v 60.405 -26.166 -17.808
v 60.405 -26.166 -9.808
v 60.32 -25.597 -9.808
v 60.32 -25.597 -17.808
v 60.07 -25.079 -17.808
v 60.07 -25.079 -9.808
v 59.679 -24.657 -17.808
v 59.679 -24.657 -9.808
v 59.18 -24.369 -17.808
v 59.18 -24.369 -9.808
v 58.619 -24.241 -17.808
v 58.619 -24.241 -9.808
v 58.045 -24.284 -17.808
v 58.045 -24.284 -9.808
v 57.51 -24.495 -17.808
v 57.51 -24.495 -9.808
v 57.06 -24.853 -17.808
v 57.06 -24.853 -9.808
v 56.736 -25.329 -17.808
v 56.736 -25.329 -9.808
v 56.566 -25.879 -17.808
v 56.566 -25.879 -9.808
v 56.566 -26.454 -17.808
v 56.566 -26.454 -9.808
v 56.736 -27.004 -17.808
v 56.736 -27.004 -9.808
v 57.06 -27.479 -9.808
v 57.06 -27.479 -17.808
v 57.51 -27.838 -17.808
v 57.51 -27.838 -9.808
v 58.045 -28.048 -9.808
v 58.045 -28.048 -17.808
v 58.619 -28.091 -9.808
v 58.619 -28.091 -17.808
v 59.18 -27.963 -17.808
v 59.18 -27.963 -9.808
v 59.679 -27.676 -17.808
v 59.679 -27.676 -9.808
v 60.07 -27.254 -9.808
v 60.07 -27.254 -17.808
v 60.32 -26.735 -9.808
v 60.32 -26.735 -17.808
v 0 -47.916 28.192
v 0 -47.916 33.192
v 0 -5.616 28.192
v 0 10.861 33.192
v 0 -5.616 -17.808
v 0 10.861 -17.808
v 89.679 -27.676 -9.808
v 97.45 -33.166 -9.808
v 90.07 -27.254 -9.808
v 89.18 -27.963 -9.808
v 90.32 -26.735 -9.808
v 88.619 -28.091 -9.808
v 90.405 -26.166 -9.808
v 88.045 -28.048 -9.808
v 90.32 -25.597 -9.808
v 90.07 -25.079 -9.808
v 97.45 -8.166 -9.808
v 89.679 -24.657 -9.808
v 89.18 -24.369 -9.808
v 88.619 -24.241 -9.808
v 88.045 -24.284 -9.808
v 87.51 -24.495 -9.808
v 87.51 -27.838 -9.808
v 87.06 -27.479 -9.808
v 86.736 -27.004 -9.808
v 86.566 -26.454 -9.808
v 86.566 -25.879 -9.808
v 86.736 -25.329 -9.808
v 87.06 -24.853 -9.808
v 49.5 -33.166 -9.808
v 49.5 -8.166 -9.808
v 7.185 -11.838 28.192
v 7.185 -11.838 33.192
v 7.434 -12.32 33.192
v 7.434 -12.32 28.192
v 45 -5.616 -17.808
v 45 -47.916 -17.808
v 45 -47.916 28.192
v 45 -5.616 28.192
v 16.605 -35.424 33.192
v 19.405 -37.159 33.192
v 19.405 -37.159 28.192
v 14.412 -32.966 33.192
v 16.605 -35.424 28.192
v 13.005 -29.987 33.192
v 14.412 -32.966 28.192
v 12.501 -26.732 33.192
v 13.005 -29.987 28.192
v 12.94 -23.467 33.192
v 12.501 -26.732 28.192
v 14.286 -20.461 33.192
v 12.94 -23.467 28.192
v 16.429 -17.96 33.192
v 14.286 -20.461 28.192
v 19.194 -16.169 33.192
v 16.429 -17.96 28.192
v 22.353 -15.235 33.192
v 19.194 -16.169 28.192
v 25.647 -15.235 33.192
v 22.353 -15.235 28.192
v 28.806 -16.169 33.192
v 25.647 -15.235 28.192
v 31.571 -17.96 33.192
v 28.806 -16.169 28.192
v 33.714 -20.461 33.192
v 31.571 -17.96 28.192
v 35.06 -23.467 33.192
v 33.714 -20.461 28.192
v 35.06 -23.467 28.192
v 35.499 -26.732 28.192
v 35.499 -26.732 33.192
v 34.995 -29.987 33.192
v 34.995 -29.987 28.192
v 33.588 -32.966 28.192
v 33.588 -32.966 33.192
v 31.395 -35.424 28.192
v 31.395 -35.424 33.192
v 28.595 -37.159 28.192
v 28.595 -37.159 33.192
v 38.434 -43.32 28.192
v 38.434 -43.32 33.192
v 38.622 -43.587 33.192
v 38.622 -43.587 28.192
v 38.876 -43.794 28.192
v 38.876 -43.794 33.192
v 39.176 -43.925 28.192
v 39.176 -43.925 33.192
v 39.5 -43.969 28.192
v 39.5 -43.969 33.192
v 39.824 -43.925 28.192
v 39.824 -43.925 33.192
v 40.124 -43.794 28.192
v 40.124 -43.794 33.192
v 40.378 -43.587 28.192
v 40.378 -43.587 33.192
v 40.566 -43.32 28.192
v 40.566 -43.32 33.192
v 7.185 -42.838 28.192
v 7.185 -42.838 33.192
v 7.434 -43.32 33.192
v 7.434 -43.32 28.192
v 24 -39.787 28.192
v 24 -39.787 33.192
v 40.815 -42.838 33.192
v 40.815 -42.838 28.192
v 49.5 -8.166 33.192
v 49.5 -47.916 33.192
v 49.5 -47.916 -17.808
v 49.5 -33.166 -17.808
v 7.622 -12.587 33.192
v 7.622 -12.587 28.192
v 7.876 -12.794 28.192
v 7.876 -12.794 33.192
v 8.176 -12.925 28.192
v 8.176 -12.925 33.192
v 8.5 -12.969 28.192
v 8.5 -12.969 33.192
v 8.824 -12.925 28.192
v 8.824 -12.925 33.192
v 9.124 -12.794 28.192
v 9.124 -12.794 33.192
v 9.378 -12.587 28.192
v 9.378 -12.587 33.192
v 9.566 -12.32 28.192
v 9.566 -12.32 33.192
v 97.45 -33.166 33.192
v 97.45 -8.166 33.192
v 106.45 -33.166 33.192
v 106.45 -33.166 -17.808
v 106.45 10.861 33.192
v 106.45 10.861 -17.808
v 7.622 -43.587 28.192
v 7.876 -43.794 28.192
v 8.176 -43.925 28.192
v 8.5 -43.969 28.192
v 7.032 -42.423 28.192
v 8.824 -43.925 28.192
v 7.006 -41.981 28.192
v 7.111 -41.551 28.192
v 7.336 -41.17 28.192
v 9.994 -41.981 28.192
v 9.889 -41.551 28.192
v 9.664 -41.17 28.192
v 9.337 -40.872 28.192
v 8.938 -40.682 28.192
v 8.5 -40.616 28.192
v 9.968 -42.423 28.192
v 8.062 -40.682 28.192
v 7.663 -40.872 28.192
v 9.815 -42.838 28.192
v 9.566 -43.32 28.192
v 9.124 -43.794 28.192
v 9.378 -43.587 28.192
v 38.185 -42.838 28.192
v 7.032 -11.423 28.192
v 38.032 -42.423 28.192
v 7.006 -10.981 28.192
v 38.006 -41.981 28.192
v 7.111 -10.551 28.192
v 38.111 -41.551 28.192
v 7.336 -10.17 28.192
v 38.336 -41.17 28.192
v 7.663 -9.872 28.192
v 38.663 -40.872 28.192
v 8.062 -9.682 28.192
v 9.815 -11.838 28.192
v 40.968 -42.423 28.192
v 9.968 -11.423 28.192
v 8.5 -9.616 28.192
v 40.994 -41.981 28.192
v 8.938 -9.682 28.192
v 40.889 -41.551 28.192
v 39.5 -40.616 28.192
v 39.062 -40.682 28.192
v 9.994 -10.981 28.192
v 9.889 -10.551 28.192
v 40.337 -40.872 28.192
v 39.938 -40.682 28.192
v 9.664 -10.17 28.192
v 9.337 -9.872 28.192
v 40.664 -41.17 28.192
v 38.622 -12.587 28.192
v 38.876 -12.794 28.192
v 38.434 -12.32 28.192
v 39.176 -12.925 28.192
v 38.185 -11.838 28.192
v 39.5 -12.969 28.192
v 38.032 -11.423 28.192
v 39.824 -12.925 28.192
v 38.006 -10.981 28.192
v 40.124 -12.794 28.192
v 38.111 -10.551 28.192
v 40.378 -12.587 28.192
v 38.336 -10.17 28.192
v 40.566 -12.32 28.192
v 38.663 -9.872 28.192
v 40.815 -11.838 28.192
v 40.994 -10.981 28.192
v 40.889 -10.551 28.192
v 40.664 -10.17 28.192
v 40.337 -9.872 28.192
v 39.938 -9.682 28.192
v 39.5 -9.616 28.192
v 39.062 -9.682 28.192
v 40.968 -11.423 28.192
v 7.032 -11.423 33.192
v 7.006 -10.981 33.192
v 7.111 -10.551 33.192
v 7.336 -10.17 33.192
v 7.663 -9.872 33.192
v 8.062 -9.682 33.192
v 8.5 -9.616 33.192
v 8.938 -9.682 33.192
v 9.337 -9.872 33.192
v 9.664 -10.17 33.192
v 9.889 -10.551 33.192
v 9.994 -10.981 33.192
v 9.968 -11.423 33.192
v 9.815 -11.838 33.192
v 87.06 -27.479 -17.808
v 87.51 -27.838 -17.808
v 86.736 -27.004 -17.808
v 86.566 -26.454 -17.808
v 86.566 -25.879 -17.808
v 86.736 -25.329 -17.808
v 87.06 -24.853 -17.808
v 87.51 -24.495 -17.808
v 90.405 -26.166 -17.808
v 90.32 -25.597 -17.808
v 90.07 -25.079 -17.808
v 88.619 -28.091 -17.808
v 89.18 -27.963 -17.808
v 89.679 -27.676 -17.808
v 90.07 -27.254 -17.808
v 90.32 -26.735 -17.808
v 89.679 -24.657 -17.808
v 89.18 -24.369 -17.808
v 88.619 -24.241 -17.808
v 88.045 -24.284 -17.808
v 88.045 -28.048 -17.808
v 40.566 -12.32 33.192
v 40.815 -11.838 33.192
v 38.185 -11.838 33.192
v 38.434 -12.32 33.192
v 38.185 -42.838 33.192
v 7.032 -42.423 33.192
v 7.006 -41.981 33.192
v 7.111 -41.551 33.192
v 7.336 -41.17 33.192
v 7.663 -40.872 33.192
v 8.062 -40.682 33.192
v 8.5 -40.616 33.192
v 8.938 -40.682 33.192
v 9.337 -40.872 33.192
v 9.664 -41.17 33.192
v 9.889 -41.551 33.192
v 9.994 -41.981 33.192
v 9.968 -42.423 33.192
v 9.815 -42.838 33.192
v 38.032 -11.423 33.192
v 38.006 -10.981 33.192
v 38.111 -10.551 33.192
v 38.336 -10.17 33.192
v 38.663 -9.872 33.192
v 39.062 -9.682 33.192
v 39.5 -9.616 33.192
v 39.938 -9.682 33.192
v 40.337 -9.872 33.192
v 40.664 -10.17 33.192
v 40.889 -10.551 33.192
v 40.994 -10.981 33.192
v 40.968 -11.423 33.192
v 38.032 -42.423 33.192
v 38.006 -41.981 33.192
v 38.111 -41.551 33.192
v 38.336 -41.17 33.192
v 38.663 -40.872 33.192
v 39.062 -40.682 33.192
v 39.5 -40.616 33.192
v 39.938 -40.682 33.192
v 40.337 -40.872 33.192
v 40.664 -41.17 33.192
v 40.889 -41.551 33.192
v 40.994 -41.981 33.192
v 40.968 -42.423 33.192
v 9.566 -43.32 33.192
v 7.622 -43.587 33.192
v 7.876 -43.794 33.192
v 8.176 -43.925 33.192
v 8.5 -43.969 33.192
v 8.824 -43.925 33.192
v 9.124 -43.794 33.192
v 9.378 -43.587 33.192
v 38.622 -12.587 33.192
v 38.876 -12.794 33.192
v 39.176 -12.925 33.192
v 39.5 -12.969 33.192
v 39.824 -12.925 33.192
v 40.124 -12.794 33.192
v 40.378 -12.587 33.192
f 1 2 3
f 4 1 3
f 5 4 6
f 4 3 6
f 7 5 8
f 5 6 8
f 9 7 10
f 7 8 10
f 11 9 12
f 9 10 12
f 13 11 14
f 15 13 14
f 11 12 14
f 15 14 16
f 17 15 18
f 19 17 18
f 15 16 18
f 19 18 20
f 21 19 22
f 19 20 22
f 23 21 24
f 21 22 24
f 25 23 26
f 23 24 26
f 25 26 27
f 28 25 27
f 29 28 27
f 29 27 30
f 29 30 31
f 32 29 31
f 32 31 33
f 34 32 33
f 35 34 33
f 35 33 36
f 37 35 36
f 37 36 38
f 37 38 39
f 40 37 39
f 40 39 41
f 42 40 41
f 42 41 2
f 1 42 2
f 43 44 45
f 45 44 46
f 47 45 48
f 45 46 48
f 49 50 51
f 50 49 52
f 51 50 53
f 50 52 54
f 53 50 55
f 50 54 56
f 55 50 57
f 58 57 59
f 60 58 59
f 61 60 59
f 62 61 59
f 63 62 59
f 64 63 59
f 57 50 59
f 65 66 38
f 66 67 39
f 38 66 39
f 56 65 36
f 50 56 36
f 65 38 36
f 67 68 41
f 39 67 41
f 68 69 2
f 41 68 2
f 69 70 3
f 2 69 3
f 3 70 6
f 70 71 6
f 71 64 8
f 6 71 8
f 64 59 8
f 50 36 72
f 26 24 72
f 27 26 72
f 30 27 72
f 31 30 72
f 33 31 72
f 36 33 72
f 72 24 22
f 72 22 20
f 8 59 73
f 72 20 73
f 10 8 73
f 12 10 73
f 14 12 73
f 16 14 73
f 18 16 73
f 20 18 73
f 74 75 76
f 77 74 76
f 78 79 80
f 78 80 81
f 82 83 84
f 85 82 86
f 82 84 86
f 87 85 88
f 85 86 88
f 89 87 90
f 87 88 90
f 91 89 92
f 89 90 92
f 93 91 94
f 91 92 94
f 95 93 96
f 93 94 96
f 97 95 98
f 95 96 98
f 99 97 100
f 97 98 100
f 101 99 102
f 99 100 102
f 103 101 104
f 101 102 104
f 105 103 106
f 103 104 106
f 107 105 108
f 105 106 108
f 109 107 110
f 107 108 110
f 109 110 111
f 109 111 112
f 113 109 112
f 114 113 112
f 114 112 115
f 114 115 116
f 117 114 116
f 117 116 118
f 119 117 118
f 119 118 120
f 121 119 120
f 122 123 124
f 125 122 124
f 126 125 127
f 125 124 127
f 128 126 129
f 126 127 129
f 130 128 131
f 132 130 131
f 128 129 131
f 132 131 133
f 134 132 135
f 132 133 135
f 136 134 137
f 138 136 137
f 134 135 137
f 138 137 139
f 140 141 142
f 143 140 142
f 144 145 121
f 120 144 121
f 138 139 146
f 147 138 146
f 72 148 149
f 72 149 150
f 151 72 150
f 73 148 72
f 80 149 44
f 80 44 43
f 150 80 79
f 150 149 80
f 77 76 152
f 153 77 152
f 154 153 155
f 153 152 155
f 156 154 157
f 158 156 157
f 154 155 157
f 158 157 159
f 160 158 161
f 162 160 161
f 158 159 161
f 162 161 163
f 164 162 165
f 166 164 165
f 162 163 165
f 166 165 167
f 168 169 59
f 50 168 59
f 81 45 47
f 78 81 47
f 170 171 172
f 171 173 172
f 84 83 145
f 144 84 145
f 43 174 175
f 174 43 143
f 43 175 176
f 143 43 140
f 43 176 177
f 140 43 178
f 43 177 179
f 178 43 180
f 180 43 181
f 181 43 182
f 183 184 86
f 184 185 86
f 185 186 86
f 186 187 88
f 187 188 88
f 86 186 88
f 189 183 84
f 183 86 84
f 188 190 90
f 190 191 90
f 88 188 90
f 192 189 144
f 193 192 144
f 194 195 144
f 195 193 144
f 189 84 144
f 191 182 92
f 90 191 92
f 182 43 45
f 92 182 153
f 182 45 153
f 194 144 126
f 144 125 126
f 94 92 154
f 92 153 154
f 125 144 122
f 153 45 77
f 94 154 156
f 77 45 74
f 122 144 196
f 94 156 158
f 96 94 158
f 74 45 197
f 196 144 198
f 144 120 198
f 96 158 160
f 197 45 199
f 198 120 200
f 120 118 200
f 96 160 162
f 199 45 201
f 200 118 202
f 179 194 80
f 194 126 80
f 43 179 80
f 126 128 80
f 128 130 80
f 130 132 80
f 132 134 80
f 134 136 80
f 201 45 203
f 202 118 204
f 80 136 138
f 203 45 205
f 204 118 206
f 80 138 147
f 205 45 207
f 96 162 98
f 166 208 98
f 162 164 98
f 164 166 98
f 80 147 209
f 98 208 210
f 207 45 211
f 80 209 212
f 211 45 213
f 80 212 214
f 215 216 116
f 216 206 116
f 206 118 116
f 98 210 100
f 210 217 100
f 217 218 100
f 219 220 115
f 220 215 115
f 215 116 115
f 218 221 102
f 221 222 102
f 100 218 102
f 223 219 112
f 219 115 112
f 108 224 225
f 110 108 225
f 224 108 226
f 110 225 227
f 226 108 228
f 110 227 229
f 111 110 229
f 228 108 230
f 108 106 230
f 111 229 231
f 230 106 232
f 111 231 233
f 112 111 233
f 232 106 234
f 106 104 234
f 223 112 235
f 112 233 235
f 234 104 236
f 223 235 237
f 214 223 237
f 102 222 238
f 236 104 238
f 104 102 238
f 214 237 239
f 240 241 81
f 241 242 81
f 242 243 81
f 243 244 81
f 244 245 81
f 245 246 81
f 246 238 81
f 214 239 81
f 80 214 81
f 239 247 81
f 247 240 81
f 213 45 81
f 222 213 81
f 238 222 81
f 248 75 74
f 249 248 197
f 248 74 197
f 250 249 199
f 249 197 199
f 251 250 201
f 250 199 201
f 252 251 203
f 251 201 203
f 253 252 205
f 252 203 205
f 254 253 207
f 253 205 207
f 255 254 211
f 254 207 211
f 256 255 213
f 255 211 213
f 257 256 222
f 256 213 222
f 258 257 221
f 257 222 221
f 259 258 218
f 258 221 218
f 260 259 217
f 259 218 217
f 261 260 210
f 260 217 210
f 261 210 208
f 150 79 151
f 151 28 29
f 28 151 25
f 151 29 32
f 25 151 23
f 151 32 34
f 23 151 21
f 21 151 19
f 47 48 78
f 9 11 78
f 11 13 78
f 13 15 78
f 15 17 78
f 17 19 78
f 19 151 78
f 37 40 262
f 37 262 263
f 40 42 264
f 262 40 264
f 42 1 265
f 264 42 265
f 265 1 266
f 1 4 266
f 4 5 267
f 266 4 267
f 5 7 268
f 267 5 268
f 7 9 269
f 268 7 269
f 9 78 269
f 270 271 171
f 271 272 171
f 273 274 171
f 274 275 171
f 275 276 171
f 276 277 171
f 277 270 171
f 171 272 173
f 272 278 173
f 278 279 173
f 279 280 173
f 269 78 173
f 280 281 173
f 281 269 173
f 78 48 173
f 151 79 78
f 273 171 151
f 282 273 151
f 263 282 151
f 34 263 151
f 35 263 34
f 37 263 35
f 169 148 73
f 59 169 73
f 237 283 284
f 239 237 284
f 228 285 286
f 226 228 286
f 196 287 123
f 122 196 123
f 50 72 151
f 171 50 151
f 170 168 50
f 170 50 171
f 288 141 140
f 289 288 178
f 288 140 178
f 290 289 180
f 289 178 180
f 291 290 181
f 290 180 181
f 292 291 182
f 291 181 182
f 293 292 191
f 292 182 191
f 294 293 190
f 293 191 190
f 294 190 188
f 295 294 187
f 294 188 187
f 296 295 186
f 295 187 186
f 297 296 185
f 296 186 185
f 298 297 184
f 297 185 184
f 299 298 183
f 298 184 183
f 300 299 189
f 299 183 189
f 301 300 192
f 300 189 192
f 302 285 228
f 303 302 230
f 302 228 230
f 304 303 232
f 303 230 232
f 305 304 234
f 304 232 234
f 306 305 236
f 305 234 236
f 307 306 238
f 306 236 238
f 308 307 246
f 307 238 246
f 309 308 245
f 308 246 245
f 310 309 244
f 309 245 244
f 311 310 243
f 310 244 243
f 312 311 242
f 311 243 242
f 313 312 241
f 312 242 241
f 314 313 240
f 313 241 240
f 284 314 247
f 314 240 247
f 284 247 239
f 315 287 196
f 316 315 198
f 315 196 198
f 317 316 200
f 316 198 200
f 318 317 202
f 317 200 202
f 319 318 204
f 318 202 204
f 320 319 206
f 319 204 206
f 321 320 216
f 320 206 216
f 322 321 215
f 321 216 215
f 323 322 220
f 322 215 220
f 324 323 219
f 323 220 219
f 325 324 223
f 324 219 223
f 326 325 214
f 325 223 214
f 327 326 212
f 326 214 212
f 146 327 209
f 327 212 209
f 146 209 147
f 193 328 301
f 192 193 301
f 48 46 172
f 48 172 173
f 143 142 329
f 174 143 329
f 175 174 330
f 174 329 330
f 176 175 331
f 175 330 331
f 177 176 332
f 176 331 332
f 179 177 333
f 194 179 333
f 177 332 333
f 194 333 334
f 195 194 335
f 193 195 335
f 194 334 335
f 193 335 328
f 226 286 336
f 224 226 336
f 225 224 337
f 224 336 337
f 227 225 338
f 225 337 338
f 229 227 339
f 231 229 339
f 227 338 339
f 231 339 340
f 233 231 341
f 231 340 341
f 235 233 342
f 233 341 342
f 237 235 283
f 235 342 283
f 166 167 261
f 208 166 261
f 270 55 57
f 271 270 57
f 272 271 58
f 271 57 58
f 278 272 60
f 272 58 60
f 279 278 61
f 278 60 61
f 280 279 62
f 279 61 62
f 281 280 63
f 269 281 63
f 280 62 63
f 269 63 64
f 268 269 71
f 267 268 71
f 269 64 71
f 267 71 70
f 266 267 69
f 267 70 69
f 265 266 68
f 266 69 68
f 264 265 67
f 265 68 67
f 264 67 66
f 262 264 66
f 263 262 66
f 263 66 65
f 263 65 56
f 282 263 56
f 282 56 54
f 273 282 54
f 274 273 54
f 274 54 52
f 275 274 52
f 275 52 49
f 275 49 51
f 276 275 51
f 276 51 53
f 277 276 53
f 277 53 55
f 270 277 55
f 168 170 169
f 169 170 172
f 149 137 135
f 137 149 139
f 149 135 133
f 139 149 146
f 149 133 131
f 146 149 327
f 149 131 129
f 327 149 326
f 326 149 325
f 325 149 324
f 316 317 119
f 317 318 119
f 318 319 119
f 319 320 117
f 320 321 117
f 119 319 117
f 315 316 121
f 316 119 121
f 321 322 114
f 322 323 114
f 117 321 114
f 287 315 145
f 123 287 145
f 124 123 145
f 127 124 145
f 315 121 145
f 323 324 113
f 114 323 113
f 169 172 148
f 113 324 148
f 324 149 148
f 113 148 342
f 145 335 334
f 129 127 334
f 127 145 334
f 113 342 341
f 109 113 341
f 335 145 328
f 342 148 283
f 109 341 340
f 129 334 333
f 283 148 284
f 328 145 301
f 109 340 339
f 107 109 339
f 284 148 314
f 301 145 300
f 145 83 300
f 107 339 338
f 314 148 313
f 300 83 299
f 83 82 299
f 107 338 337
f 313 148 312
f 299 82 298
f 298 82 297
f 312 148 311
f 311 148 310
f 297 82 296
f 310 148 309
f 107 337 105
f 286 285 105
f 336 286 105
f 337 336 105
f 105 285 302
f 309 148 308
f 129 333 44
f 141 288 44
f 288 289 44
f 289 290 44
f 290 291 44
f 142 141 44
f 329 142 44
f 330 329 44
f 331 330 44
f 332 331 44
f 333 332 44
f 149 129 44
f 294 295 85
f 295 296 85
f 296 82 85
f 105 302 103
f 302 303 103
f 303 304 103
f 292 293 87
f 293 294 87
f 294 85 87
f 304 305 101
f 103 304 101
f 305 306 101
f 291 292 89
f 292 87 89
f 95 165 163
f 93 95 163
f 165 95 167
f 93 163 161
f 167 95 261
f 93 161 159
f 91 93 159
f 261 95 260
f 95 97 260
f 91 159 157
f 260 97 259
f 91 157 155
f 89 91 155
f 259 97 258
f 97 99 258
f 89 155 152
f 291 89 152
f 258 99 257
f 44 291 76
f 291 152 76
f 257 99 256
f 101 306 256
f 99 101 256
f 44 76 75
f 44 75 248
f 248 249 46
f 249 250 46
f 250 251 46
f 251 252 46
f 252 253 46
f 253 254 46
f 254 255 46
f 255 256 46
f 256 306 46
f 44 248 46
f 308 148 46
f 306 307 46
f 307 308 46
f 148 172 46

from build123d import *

# Parameters (mm, degrees)
SKETCH1_W            = 48
SKETCH1_H            = 53
BOSS_EXTRUDE1_DEPTH  = 10
SKETCH2_W            = 48
SKETCH2_H            = 5.616325
BOSS_EXTRUDE2_DEPTH  = 33.1917878
SKETCH4_W            = 4
SKETCH4_H            = 10
BOSS_EXTRUDE4_DEPTH  = 40
SKETCH5_W            = 48
SKETCH5_H            = 10.8609375
BOSS_EXTRUDE5_DEPTH  = 23.1917878
SKETCH6_W            = 48
SKETCH6_H            = 5
BOSS_EXTRUDE6_DEPTH  = 42.3
SKETCH7_W            = 12.8082122
SKETCH7_H            = 16.4772625
BOSS_EXTRUDE7_DEPTH  = 48
CUT_EXTRUDE1_REACH   = 84.426
SKETCH8_R            = 11.5
SKETCH8_R_2          = 1.5
FILLET1_R            = 10
FILLET2_R            = 4
SKETCH9_W            = 5
SKETCH9_H            = 16.4772625
BOSS_EXTRUDE9_DEPTH  = 48
CUT_EXTRUDE2_DEPTH   = 88.252507127
SKETCH11_W           = 51
SKETCH11_H           = 16.4772625
BOSS_EXTRUDE10_DEPTH = 49.45
BOSS_EXTRUDE11_DEPTH = 46
SKETCH16_W           = 47.95
SKETCH16_H           = 51
BOSS_EXTRUDE14_DEPTH = 2.55
SKETCH14_W           = 5
SKETCH14_H           = 42.3
BOSS_EXTRUDE13_DEPTH = 1.5
SKETCH17_W           = 51
SKETCH17_H           = 19.0272625
BOSS_EXTRUDE15_DEPTH = 9
BOSS_EXTRUDE16_DEPTH = 25
SKETCH19_R           = 1.9304
CUT_EXTRUDE3_DEPTH   = 125.404890183
CUT_EXTRUDE4_REACH   = 129.391


with BuildPart() as part:
    # Sketch1 → Boss-Extrude1 (new body)
    with BuildSketch(Plane.XY):
        with Locations((24, 26.5)):
            Rectangle(SKETCH1_W, SKETCH1_H)
    extrude(amount=BOSS_EXTRUDE1_DEPTH)

    # Sketch2 → Boss-Extrude2 (add)
    with BuildSketch(Plane(origin=(0, 0, 0), x_dir=(-1, 0, 0), z_dir=(0, 0, -1))):
        with Locations((-24, -2.8081625)):
            Rectangle(SKETCH2_W, SKETCH2_H)
    extrude(amount=-BOSS_EXTRUDE2_DEPTH)

    # Sketch4 → Boss-Extrude4 (add)
    with BuildSketch(Plane.XY.offset(10)):
        with Locations((2, 48)):
            Rectangle(SKETCH4_W, SKETCH4_H)
        with Locations((46, 48)):
            Rectangle(SKETCH4_W, SKETCH4_H)
    extrude(amount=BOSS_EXTRUDE4_DEPTH)

    # Sketch5 → Boss-Extrude5 (add)
    with BuildSketch(Plane.XY.offset(10)):
        with Locations((24, 5.43046875)):
            Rectangle(SKETCH5_W, SKETCH5_H)
    extrude(amount=BOSS_EXTRUDE5_DEPTH)

    # Sketch6 → Boss-Extrude6 (add)
    with BuildSketch(Plane.XZ.offset(5.616325)):
        with Locations((24, 30.6917878)):
            Rectangle(SKETCH6_W, SKETCH6_H)
    extrude(amount=BOSS_EXTRUDE6_DEPTH)

    # Sketch7 → Boss-Extrude7 (add)
    with BuildSketch(Plane.ZY):
        with Locations((-6.4041061, 2.62230625)):
            Rectangle(SKETCH7_W, SKETCH7_H)
    extrude(amount=-BOSS_EXTRUDE7_DEPTH)

    # Sketch8 → Cut-Extrude1 (cut, up to next)
    with BuildSketch(Plane(origin=(0, 0, 28.1917878), x_dir=(-1, 0, 0), z_dir=(0, 0, -1)), mode=Mode.PRIVATE) as cut_extrude1_sk1:
        with Locations((-24, -26.616325)):
            Circle(SKETCH8_R)
    cut_extrude1_tool1 = extrude(cut_extrude1_sk1.sketch, amount=-CUT_EXTRUDE1_REACH, mode=Mode.PRIVATE) & part.part
    # Sketch8 → Cut-Extrude1 (cut, up to next)
    with BuildSketch(Plane(origin=(0, 0, 28.1917878), x_dir=(-1, 0, 0), z_dir=(0, 0, -1)), mode=Mode.PRIVATE) as cut_extrude1_sk2:
        with Locations((-39.5, -11.116325)):
            Circle(SKETCH8_R_2)
    cut_extrude1_tool2 = extrude(cut_extrude1_sk2.sketch, amount=-CUT_EXTRUDE1_REACH, mode=Mode.PRIVATE) & part.part
    # Sketch8 → Cut-Extrude1 (cut, up to next)
    with BuildSketch(Plane(origin=(0, 0, 28.1917878), x_dir=(-1, 0, 0), z_dir=(0, 0, -1)), mode=Mode.PRIVATE) as cut_extrude1_sk3:
        with Locations((-39.5, -42.116325)):
            Circle(SKETCH8_R_2)
    cut_extrude1_tool3 = extrude(cut_extrude1_sk3.sketch, amount=-CUT_EXTRUDE1_REACH, mode=Mode.PRIVATE) & part.part
    # Sketch8 → Cut-Extrude1 (cut, up to next)
    with BuildSketch(Plane(origin=(0, 0, 28.1917878), x_dir=(-1, 0, 0), z_dir=(0, 0, -1)), mode=Mode.PRIVATE) as cut_extrude1_sk4:
        with Locations((-8.5, -11.116325)):
            Circle(SKETCH8_R_2)
    cut_extrude1_tool4 = extrude(cut_extrude1_sk4.sketch, amount=-CUT_EXTRUDE1_REACH, mode=Mode.PRIVATE) & part.part
    # Sketch8 → Cut-Extrude1 (cut, up to next)
    with BuildSketch(Plane(origin=(0, 0, 28.1917878), x_dir=(-1, 0, 0), z_dir=(0, 0, -1)), mode=Mode.PRIVATE) as cut_extrude1_sk5:
        with Locations((-8.5, -42.116325)):
            Circle(SKETCH8_R_2)
    cut_extrude1_tool5 = extrude(cut_extrude1_sk5.sketch, amount=-CUT_EXTRUDE1_REACH, mode=Mode.PRIVATE) & part.part
    add(cut_extrude1_tool1.solids().sort_by_distance((24, -26.616325, 28.191788))[0], mode=Mode.SUBTRACT)
    add(cut_extrude1_tool2.solids().sort_by_distance((39.5, -11.116325, 28.191788))[0], mode=Mode.SUBTRACT)
    add(cut_extrude1_tool3.solids().sort_by_distance((39.5, -42.116325, 28.191788))[0], mode=Mode.SUBTRACT)
    add(cut_extrude1_tool4.solids().sort_by_distance((8.5, -11.116325, 28.191788))[0], mode=Mode.SUBTRACT)
    add(cut_extrude1_tool5.solids().sort_by_distance((8.5, -42.116325, 28.191788))[0], mode=Mode.SUBTRACT)

    # Fillet1
    fillet1_edges = [part.edges().sort_by_distance(p)[0] for p in [
        (24, 10.8609375, 0),
    ]]
    fillet(fillet1_edges, radius=FILLET1_R)

    # Fillet2
    fillet2_edges = [part.edges().sort_by_distance(p)[0] for p in [
        (2, 43, 10),
        (46, 43, 10),
    ]]
    fillet(fillet2_edges, radius=FILLET2_R)

    # Sketch9 → Boss-Extrude9 (add)
    with BuildSketch(Plane(origin=(48, 0, 0), x_dir=(0, 0, -1), z_dir=(1, 0, 0))):
        with Locations((15.3082122, 2.62230625)):
            Rectangle(SKETCH9_W, SKETCH9_H)
    extrude(amount=-BOSS_EXTRUDE9_DEPTH)

    # Sketch10 → Cut-Extrude2 (cut, through all)
    with BuildSketch(Plane(origin=(48, 0, 0), x_dir=(0, 0, -1), z_dir=(1, 0, 0))):
        Polygon((17.8082122, 10.8609375), (-33.1917878, 10.8609375), (-76.887145623, 43.902095521), (-50.794096938, 74.436514195), (27.207463492, 71.105486703), align=None)
    extrude(amount=-CUT_EXTRUDE2_DEPTH, mode=Mode.SUBTRACT)

    # Sketch11 → Boss-Extrude10 (add)
    with BuildSketch(Plane(origin=(48, 0, 0), x_dir=(0, 0, -1), z_dir=(1, 0, 0))):
        with Locations((-7.6917878, 2.62230625)):
            Rectangle(SKETCH11_W, SKETCH11_H)
    extrude(amount=BOSS_EXTRUDE10_DEPTH)

    # Sketch12 → Boss-Extrude11 (add)
    with BuildSketch(Plane(origin=(0, 0, 28.1917878), x_dir=(-1, 0, 0), z_dir=(0, 0, -1))):
        Polygon((-48, -47.916325), (-45, -47.916325), (-45, -5.616325), (-49.5, -5.616325), (-49.5, -47.916325), align=None)
    extrude(amount=BOSS_EXTRUDE11_DEPTH)

    # Sketch16 → Boss-Extrude14 (add)
    with BuildSketch(Plane.XZ.offset(5.616325)):
        with Locations((73.475, 7.6917878)):
            Rectangle(SKETCH16_W, SKETCH16_H)
    extrude(amount=BOSS_EXTRUDE14_DEPTH)

    # Sketch14 → Boss-Extrude13 (add)
    with BuildSketch(Plane(origin=(49.5, 0, 0), x_dir=(0, 0, -1), z_dir=(1, 0, 0))):
        with Locations((-30.6917878, -26.766325)):
            Rectangle(SKETCH14_W, SKETCH14_H)
    extrude(amount=-BOSS_EXTRUDE13_DEPTH)

    # Sketch17 → Boss-Extrude15 (add)
    with BuildSketch(Plane(origin=(97.45, 0, 0), x_dir=(0, 0, -1), z_dir=(1, 0, 0))):
        with Locations((-7.6917878, 1.34730625)):
            Rectangle(SKETCH17_W, SKETCH17_H)
    extrude(amount=BOSS_EXTRUDE15_DEPTH)

    # Sketch18 → Boss-Extrude16 (add)
    with BuildSketch(Plane.XZ.offset(8.166325)):
        Polygon((49.5, -17.8082122), (106.45, -17.8082122), (106.45, -9.8082122), (106.45, 33.1917878), (97.45, 33.1917878), (97.45, -9.8082122), (49.5, -9.8082122), align=None)
    extrude(amount=BOSS_EXTRUDE16_DEPTH)

    # Sketch19 → Cut-Extrude3 (cut, through all)
    with BuildSketch(Plane.XY.offset(-9.8082122)):
        with Locations((58.475, -26.166325)):
            Circle(SKETCH19_R)
        with Locations((88.475, -26.166325)):
            Circle(SKETCH19_R)
    extrude(amount=-CUT_EXTRUDE3_DEPTH, mode=Mode.SUBTRACT)

    # Sketch20 → Cut-Extrude4 (cut, up to next)
    with BuildSketch(Plane.XY.offset(33.1917878), mode=Mode.PRIVATE) as cut_extrude4_sk1:
        with BuildLine():
            Line((7.184805756, -11.837618352), (7.433777419, -12.319738309))
            ThreePointArc((7.433777419, -12.319738309), (8.5, -12.969130092), (9.566222581, -12.319738309))
            Line((9.566222581, -12.319738309), (9.815194244, -11.837618352))
            ThreePointArc((9.815194244, -11.837618352), (8.5, -12.616325), (7.184805756, -11.837618352))
        make_face()
    cut_extrude4_tool1 = extrude(cut_extrude4_sk1.sketch, amount=-CUT_EXTRUDE4_REACH, mode=Mode.PRIVATE) & part.part
    # Sketch20 → Cut-Extrude4 (cut, up to next)
    with BuildSketch(Plane.XY.offset(33.1917878), mode=Mode.PRIVATE) as cut_extrude4_sk2:
        with BuildLine():
            Line((7.184805756, -42.837618352), (7.433777419, -43.319738309))
            ThreePointArc((7.433777419, -43.319738309), (8.5, -43.969130092), (9.566222581, -43.319738309))
            Line((9.566222581, -43.319738309), (9.815194244, -42.837618352))
            ThreePointArc((9.815194244, -42.837618352), (8.5, -43.616325), (7.184805756, -42.837618352))
        make_face()
    cut_extrude4_tool2 = extrude(cut_extrude4_sk2.sketch, amount=-CUT_EXTRUDE4_REACH, mode=Mode.PRIVATE) & part.part
    # Sketch20 → Cut-Extrude4 (cut, up to next)
    with BuildSketch(Plane.XY.offset(33.1917878), mode=Mode.PRIVATE) as cut_extrude4_sk3:
        with BuildLine():
            Line((38.184805756, -42.837618352), (38.433777419, -43.319738309))
            ThreePointArc((38.433777419, -43.319738309), (39.5, -43.969130092), (40.566222581, -43.319738309))
            Line((40.566222581, -43.319738309), (40.815194244, -42.837618352))
            ThreePointArc((40.815194244, -42.837618352), (39.5, -43.616325), (38.184805756, -42.837618352))
        make_face()
    cut_extrude4_tool3 = extrude(cut_extrude4_sk3.sketch, amount=-CUT_EXTRUDE4_REACH, mode=Mode.PRIVATE) & part.part
    # Sketch20 → Cut-Extrude4 (cut, up to next)
    with BuildSketch(Plane.XY.offset(33.1917878), mode=Mode.PRIVATE) as cut_extrude4_sk4:
        with BuildLine():
            Line((38.184805756, -11.837618352), (38.433777419, -12.319738309))
            ThreePointArc((38.433777419, -12.319738309), (39.5, -12.969130092), (40.566222581, -12.319738309))
            Line((40.566222581, -12.319738309), (40.815194244, -11.837618352))
            ThreePointArc((40.815194244, -11.837618352), (39.5, -12.616325), (38.184805756, -11.837618352))
        make_face()
    cut_extrude4_tool4 = extrude(cut_extrude4_sk4.sketch, amount=-CUT_EXTRUDE4_REACH, mode=Mode.PRIVATE) & part.part
    # Sketch20 → Cut-Extrude4 (cut, up to next)
    with BuildSketch(Plane.XY.offset(33.1917878), mode=Mode.PRIVATE) as cut_extrude4_sk5:
        with BuildLine():
            Line((19.405287598, -37.158555217), (24, -39.787183437))
            Line((24, -39.787183437), (28.594712402, -37.158555217))
            ThreePointArc((28.594712402, -37.158555217), (24, -38.116325), (19.405287598, -37.158555217))
        make_face()
    cut_extrude4_tool5 = extrude(cut_extrude4_sk5.sketch, amount=-CUT_EXTRUDE4_REACH, mode=Mode.PRIVATE) & part.part
    add(cut_extrude4_tool1.solids().sort_by_distance((8.5, -12.63481, 33.191788))[0], mode=Mode.SUBTRACT)
    add(cut_extrude4_tool2.solids().sort_by_distance((8.5, -43.63481, 33.191788))[0], mode=Mode.SUBTRACT)
    add(cut_extrude4_tool3.solids().sort_by_distance((39.5, -43.63481, 33.191788))[0], mode=Mode.SUBTRACT)
    add(cut_extrude4_tool4.solids().sort_by_distance((39.5, -12.63481, 33.191788))[0], mode=Mode.SUBTRACT)
    add(cut_extrude4_tool5.solids().sort_by_distance((24, -38.507203, 33.191788))[0], mode=Mode.SUBTRACT)


solid = part.part
